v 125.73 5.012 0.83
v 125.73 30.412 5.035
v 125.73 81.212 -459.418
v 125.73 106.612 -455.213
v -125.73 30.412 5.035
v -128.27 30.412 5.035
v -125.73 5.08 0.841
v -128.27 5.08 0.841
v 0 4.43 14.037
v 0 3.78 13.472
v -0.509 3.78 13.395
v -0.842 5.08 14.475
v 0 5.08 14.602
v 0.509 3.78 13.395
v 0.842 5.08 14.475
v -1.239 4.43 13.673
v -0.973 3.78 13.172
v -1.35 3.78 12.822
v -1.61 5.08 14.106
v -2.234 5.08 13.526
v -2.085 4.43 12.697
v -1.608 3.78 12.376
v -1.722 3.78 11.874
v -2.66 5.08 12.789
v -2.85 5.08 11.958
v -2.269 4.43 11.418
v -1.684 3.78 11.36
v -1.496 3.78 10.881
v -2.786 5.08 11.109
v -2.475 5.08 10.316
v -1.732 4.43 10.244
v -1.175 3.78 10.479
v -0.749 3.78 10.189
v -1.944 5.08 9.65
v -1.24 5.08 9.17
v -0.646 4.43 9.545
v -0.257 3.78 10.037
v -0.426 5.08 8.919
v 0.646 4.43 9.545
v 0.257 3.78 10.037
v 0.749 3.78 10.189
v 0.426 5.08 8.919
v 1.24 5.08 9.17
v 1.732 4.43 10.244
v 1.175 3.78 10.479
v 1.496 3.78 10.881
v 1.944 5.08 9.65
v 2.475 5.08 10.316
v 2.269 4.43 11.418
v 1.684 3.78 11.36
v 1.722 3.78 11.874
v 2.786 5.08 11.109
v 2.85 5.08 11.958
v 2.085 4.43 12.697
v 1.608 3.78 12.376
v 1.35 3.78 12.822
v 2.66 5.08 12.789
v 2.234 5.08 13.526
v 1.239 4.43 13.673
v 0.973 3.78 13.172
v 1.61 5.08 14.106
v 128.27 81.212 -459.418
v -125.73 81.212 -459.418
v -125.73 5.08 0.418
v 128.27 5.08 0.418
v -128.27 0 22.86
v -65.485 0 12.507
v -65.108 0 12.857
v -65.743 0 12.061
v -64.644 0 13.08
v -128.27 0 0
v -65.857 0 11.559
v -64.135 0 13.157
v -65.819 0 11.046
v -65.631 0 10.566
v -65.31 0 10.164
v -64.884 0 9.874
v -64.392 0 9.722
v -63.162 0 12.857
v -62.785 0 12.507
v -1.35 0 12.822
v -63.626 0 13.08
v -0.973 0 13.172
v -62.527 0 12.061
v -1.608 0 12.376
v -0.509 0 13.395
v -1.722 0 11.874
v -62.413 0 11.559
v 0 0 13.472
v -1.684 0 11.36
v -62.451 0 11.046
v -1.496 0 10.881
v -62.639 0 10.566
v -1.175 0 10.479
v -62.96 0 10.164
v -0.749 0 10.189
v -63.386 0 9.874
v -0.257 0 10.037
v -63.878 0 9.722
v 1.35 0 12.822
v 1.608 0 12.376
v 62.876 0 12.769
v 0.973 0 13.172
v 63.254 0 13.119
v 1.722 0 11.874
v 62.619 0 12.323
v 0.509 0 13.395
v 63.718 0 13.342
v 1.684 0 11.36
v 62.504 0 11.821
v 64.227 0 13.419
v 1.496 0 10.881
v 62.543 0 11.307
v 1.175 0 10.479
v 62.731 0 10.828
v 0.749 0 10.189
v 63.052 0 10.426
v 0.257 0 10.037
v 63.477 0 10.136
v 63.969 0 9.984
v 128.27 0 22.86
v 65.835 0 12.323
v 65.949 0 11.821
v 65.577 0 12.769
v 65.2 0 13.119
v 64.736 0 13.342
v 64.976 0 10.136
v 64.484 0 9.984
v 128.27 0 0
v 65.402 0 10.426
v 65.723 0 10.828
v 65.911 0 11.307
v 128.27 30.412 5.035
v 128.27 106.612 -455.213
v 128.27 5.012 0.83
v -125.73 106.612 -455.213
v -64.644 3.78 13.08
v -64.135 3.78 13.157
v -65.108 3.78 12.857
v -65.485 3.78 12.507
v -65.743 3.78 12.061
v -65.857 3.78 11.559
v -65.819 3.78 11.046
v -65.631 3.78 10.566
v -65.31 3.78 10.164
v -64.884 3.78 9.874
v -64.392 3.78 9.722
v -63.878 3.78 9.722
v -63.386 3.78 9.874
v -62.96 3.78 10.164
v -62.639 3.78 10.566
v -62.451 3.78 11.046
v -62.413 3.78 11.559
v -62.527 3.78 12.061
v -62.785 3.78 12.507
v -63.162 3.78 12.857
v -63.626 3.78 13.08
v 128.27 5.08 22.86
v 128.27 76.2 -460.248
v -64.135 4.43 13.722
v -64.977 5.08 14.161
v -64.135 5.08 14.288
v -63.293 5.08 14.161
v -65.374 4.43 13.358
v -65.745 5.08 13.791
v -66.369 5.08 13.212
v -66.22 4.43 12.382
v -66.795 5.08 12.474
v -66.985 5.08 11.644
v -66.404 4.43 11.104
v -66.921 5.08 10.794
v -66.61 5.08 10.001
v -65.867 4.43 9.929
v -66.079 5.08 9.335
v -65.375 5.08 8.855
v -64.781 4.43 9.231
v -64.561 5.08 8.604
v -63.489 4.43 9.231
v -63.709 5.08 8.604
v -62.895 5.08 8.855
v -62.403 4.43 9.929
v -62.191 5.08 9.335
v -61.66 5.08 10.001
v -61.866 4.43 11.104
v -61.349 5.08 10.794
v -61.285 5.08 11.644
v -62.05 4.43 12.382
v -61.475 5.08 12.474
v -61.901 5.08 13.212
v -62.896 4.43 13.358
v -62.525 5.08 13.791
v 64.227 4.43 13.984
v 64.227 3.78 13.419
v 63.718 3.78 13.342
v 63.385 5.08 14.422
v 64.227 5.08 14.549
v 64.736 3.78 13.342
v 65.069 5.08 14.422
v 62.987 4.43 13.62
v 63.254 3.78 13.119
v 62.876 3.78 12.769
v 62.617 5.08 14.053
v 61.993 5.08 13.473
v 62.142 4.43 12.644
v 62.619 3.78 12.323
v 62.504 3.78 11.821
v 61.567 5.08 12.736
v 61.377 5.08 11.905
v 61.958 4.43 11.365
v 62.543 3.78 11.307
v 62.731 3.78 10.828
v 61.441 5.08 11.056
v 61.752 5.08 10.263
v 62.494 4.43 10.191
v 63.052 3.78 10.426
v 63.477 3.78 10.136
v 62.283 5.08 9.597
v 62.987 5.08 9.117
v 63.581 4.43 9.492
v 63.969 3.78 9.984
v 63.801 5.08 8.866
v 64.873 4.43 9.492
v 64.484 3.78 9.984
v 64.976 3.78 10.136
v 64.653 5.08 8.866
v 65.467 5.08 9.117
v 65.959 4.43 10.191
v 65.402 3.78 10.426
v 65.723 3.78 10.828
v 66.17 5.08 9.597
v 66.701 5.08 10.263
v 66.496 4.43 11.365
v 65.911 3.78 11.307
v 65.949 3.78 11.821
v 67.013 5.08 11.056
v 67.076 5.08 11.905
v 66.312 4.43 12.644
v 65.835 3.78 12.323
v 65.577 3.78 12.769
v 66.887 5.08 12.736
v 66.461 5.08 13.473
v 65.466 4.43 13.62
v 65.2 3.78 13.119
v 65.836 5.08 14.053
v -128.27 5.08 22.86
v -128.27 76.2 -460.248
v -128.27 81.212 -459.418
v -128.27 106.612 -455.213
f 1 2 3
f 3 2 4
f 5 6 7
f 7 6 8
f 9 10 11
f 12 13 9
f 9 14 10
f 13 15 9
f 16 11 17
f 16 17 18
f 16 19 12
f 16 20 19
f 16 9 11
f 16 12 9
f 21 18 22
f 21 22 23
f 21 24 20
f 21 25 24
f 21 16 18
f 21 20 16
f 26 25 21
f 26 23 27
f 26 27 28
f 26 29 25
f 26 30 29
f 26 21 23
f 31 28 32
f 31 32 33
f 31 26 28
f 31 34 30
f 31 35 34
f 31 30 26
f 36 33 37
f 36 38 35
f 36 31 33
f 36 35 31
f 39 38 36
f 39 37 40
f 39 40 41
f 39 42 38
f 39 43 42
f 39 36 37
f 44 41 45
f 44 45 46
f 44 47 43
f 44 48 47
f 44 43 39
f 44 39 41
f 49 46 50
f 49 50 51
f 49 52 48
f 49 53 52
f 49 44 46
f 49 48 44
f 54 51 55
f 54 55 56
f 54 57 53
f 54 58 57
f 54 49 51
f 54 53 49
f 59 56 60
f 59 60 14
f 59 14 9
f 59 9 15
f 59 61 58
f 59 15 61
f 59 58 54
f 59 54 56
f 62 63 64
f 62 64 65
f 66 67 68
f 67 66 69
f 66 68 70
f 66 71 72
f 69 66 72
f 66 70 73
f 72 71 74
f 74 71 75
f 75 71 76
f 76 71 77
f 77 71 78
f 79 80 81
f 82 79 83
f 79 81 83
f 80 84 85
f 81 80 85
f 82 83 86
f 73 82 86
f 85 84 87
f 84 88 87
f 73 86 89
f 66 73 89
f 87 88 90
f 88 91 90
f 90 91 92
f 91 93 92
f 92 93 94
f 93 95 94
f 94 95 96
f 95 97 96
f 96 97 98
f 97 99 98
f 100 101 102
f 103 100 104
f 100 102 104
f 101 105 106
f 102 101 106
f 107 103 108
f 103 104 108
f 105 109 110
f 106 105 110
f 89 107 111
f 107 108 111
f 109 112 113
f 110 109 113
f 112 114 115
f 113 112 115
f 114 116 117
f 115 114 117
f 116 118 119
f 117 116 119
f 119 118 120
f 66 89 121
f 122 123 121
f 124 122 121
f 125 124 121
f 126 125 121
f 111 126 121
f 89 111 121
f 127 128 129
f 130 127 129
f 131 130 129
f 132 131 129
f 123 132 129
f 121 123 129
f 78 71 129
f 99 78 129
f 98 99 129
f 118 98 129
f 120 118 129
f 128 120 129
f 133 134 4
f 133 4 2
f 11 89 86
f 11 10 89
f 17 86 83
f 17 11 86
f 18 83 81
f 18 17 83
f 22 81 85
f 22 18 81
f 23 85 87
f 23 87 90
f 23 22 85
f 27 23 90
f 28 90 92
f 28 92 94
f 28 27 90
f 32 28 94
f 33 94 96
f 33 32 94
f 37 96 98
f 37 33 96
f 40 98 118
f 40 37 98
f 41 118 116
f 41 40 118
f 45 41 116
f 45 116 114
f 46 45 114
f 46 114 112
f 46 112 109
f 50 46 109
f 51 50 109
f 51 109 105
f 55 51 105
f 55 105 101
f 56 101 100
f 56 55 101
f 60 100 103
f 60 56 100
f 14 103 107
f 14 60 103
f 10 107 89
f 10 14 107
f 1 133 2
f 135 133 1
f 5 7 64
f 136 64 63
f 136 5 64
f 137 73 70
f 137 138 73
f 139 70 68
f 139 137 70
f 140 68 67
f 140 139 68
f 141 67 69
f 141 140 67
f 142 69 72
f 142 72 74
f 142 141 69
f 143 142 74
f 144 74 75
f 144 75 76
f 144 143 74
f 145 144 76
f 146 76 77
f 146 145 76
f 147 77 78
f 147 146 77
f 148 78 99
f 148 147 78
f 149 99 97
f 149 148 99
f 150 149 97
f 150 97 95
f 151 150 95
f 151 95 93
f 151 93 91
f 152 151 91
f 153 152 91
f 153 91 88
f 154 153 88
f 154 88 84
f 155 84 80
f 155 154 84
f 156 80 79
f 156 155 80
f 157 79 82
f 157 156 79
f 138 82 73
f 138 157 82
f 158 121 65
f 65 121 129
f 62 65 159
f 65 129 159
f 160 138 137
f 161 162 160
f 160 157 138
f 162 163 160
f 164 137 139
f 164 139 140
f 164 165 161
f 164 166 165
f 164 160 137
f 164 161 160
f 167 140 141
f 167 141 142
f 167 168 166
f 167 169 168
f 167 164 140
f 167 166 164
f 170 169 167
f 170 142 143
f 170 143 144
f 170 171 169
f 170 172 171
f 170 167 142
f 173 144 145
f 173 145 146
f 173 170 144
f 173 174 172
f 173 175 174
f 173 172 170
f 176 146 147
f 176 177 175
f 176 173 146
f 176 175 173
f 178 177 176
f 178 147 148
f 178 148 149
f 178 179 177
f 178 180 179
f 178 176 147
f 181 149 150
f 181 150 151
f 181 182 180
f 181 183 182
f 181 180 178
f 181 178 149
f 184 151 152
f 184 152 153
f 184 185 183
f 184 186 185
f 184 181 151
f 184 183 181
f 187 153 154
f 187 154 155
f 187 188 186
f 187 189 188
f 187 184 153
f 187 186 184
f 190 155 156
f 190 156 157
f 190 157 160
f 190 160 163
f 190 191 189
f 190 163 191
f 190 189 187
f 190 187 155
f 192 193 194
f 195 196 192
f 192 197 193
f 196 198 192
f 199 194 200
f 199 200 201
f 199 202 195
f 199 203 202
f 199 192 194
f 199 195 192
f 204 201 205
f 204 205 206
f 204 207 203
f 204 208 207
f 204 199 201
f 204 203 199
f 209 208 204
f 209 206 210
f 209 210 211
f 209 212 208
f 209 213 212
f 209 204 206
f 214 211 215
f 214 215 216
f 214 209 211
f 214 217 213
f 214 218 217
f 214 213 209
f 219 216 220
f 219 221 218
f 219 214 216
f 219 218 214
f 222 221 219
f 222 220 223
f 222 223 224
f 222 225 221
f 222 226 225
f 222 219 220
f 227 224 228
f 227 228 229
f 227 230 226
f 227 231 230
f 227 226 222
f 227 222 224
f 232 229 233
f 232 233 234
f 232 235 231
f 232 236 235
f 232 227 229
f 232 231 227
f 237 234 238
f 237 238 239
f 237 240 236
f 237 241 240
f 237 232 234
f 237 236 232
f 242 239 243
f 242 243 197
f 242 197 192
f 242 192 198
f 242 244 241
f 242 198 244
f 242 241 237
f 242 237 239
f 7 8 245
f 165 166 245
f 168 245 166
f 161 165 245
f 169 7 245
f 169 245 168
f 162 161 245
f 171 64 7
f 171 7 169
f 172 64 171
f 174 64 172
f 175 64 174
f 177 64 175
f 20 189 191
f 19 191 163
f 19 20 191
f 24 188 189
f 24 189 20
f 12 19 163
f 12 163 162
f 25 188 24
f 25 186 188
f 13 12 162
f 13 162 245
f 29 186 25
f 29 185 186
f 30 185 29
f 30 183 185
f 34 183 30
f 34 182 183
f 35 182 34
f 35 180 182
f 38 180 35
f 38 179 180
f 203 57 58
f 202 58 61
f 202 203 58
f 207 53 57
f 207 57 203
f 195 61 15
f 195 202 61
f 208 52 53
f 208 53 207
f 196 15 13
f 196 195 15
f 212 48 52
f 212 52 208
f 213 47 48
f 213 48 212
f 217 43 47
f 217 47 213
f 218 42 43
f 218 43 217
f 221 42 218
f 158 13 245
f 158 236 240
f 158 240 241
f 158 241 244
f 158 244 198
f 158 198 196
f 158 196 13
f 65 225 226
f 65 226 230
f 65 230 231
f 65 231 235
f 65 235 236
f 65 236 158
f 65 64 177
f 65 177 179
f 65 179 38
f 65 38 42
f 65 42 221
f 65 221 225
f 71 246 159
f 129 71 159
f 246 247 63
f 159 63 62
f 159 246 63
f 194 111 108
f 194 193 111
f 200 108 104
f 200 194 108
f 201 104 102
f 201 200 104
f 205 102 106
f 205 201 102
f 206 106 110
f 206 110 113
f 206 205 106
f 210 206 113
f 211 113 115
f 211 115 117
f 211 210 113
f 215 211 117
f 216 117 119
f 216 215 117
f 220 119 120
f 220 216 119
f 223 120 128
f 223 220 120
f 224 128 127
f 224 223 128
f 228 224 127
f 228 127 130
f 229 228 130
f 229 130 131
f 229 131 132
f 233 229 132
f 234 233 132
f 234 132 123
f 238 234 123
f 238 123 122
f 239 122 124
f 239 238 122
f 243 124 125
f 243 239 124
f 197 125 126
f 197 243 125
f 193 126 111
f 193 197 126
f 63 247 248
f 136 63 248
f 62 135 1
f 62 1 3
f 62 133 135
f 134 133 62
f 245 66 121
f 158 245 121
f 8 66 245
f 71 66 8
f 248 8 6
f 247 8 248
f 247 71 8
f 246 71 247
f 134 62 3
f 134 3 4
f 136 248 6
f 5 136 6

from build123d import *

# Parameters (mm, degrees)
SKETCH3_W                                     = 256.54
SKETCH3_H                                     = 466.513302601
BOSS_EXTRUDE1_DEPTH                           = 5.08
BOSS_EXTRUDE2_DEPTH                           = 2.54
BOSS_EXTRUDE3_DEPTH                           = 2.54
SKETCH7_W                                     = 256.54
SKETCH7_H                                     = 22.86
BOSS_EXTRUDE5_DEPTH                           = 5.08
CSK_FOR_4_FLAT_HEAD_MACHINE_SCREW1_AT_2_COUNT = 2
CSK_FOR_4_FLAT_HEAD_MACHINE_SCREW1_AT_2_PITCH = 64.13577202
CSK_FOR_4_FLAT_HEAD_MACHINE_SCREW1_AT_3_COUNT = 2
CSK_FOR_4_FLAT_HEAD_MACHINE_SCREW1_AT_3_PITCH = 128.362052605


with BuildPart() as part:
    # Sketch3 → Boss-Extrude1 (new body)
    with BuildSketch(Plane(origin=(0, 0, 0), x_dir=(1, 0, 0), z_dir=(0, 0.9865699379494779, 0.16333939370024467))):
        with Locations((0, 233.256651301)):
            Rectangle(SKETCH3_W, SKETCH3_H)
    extrude(amount=BOSS_EXTRUDE1_DEPTH)

    # Sketch5 → Boss-Extrude3 (add)
    with BuildSketch(Plane.ZY.offset(128.27)):
        Polygon((-459.41823588, 81.211775285), (-455.212937867, 106.611775285), (5.035062133, 30.411775285), (0.82976412, 5.011775285), align=None)
    extrude(amount=-BOSS_EXTRUDE3_DEPTH)

    # Sketch7 → Boss-Extrude5 (add)
    with BuildSketch(Plane(origin=(0, 0, 0), x_dir=(1, 0, 0), z_dir=(0, 1, 0))):
        with Locations((0, -11.43)):
            Rectangle(SKETCH7_W, SKETCH7_H)
    extrude(amount=BOSS_EXTRUDE5_DEPTH)

    # Sketch10 → CSK for #4 Flat Head Machine Screw1 (revolve, cut)
    with BuildSketch(Plane(origin=(-64.135, 5.08, 11.43), x_dir=(0, 0, 1), z_dir=(1, 0, 0))):
        Polygon((0, 0), (0, 5.08), (1.7272, 5.08), (1.7272, 1.300261411), (2.8575, 0), align=None)
    csk_for_4_flat_head_machine_screw1 = revolve(axis=Axis((-64.135, 11.43, 11.43), (0, -1, 0)), mode=Mode.SUBTRACT)

    # CSK for #4 Flat Head Machine Screw1 at 2: CSK for #4 Flat Head Machine Screw1 ×2
    with Locations(*[Vector(0.9999879627163539, 0, 0.004906569310242864) * (i * CSK_FOR_4_FLAT_HEAD_MACHINE_SCREW1_AT_2_PITCH) for i in range(1, CSK_FOR_4_FLAT_HEAD_MACHINE_SCREW1_AT_2_COUNT)]):
        add(csk_for_4_flat_head_machine_screw1, mode=Mode.SUBTRACT)

    # CSK for #4 Flat Head Machine Screw1 at 3: CSK for #4 Flat Head Machine Screw1 ×2
    with Locations(*[Vector(0.9999979218877366, 0, 0.0020386809972081535) * (i * CSK_FOR_4_FLAT_HEAD_MACHINE_SCREW1_AT_3_PITCH) for i in range(1, CSK_FOR_4_FLAT_HEAD_MACHINE_SCREW1_AT_3_COUNT)]):
        add(csk_for_4_flat_head_machine_screw1, mode=Mode.SUBTRACT)


with BuildPart() as body_2:
    # Sketch4 → Boss-Extrude2 (new body)
    with BuildSketch(Plane(origin=(128.27, 0, 0), x_dir=(0, 0, -1), z_dir=(1, 0, 0))):
        Polygon((-0.82976412, 5.011775285), (459.41823588, 81.211775285), (455.212937867, 106.611775285), (-5.035062133, 30.411775285), align=None)
    extrude(amount=-BOSS_EXTRUDE2_DEPTH)


solid = Compound([part.part, body_2.part])
